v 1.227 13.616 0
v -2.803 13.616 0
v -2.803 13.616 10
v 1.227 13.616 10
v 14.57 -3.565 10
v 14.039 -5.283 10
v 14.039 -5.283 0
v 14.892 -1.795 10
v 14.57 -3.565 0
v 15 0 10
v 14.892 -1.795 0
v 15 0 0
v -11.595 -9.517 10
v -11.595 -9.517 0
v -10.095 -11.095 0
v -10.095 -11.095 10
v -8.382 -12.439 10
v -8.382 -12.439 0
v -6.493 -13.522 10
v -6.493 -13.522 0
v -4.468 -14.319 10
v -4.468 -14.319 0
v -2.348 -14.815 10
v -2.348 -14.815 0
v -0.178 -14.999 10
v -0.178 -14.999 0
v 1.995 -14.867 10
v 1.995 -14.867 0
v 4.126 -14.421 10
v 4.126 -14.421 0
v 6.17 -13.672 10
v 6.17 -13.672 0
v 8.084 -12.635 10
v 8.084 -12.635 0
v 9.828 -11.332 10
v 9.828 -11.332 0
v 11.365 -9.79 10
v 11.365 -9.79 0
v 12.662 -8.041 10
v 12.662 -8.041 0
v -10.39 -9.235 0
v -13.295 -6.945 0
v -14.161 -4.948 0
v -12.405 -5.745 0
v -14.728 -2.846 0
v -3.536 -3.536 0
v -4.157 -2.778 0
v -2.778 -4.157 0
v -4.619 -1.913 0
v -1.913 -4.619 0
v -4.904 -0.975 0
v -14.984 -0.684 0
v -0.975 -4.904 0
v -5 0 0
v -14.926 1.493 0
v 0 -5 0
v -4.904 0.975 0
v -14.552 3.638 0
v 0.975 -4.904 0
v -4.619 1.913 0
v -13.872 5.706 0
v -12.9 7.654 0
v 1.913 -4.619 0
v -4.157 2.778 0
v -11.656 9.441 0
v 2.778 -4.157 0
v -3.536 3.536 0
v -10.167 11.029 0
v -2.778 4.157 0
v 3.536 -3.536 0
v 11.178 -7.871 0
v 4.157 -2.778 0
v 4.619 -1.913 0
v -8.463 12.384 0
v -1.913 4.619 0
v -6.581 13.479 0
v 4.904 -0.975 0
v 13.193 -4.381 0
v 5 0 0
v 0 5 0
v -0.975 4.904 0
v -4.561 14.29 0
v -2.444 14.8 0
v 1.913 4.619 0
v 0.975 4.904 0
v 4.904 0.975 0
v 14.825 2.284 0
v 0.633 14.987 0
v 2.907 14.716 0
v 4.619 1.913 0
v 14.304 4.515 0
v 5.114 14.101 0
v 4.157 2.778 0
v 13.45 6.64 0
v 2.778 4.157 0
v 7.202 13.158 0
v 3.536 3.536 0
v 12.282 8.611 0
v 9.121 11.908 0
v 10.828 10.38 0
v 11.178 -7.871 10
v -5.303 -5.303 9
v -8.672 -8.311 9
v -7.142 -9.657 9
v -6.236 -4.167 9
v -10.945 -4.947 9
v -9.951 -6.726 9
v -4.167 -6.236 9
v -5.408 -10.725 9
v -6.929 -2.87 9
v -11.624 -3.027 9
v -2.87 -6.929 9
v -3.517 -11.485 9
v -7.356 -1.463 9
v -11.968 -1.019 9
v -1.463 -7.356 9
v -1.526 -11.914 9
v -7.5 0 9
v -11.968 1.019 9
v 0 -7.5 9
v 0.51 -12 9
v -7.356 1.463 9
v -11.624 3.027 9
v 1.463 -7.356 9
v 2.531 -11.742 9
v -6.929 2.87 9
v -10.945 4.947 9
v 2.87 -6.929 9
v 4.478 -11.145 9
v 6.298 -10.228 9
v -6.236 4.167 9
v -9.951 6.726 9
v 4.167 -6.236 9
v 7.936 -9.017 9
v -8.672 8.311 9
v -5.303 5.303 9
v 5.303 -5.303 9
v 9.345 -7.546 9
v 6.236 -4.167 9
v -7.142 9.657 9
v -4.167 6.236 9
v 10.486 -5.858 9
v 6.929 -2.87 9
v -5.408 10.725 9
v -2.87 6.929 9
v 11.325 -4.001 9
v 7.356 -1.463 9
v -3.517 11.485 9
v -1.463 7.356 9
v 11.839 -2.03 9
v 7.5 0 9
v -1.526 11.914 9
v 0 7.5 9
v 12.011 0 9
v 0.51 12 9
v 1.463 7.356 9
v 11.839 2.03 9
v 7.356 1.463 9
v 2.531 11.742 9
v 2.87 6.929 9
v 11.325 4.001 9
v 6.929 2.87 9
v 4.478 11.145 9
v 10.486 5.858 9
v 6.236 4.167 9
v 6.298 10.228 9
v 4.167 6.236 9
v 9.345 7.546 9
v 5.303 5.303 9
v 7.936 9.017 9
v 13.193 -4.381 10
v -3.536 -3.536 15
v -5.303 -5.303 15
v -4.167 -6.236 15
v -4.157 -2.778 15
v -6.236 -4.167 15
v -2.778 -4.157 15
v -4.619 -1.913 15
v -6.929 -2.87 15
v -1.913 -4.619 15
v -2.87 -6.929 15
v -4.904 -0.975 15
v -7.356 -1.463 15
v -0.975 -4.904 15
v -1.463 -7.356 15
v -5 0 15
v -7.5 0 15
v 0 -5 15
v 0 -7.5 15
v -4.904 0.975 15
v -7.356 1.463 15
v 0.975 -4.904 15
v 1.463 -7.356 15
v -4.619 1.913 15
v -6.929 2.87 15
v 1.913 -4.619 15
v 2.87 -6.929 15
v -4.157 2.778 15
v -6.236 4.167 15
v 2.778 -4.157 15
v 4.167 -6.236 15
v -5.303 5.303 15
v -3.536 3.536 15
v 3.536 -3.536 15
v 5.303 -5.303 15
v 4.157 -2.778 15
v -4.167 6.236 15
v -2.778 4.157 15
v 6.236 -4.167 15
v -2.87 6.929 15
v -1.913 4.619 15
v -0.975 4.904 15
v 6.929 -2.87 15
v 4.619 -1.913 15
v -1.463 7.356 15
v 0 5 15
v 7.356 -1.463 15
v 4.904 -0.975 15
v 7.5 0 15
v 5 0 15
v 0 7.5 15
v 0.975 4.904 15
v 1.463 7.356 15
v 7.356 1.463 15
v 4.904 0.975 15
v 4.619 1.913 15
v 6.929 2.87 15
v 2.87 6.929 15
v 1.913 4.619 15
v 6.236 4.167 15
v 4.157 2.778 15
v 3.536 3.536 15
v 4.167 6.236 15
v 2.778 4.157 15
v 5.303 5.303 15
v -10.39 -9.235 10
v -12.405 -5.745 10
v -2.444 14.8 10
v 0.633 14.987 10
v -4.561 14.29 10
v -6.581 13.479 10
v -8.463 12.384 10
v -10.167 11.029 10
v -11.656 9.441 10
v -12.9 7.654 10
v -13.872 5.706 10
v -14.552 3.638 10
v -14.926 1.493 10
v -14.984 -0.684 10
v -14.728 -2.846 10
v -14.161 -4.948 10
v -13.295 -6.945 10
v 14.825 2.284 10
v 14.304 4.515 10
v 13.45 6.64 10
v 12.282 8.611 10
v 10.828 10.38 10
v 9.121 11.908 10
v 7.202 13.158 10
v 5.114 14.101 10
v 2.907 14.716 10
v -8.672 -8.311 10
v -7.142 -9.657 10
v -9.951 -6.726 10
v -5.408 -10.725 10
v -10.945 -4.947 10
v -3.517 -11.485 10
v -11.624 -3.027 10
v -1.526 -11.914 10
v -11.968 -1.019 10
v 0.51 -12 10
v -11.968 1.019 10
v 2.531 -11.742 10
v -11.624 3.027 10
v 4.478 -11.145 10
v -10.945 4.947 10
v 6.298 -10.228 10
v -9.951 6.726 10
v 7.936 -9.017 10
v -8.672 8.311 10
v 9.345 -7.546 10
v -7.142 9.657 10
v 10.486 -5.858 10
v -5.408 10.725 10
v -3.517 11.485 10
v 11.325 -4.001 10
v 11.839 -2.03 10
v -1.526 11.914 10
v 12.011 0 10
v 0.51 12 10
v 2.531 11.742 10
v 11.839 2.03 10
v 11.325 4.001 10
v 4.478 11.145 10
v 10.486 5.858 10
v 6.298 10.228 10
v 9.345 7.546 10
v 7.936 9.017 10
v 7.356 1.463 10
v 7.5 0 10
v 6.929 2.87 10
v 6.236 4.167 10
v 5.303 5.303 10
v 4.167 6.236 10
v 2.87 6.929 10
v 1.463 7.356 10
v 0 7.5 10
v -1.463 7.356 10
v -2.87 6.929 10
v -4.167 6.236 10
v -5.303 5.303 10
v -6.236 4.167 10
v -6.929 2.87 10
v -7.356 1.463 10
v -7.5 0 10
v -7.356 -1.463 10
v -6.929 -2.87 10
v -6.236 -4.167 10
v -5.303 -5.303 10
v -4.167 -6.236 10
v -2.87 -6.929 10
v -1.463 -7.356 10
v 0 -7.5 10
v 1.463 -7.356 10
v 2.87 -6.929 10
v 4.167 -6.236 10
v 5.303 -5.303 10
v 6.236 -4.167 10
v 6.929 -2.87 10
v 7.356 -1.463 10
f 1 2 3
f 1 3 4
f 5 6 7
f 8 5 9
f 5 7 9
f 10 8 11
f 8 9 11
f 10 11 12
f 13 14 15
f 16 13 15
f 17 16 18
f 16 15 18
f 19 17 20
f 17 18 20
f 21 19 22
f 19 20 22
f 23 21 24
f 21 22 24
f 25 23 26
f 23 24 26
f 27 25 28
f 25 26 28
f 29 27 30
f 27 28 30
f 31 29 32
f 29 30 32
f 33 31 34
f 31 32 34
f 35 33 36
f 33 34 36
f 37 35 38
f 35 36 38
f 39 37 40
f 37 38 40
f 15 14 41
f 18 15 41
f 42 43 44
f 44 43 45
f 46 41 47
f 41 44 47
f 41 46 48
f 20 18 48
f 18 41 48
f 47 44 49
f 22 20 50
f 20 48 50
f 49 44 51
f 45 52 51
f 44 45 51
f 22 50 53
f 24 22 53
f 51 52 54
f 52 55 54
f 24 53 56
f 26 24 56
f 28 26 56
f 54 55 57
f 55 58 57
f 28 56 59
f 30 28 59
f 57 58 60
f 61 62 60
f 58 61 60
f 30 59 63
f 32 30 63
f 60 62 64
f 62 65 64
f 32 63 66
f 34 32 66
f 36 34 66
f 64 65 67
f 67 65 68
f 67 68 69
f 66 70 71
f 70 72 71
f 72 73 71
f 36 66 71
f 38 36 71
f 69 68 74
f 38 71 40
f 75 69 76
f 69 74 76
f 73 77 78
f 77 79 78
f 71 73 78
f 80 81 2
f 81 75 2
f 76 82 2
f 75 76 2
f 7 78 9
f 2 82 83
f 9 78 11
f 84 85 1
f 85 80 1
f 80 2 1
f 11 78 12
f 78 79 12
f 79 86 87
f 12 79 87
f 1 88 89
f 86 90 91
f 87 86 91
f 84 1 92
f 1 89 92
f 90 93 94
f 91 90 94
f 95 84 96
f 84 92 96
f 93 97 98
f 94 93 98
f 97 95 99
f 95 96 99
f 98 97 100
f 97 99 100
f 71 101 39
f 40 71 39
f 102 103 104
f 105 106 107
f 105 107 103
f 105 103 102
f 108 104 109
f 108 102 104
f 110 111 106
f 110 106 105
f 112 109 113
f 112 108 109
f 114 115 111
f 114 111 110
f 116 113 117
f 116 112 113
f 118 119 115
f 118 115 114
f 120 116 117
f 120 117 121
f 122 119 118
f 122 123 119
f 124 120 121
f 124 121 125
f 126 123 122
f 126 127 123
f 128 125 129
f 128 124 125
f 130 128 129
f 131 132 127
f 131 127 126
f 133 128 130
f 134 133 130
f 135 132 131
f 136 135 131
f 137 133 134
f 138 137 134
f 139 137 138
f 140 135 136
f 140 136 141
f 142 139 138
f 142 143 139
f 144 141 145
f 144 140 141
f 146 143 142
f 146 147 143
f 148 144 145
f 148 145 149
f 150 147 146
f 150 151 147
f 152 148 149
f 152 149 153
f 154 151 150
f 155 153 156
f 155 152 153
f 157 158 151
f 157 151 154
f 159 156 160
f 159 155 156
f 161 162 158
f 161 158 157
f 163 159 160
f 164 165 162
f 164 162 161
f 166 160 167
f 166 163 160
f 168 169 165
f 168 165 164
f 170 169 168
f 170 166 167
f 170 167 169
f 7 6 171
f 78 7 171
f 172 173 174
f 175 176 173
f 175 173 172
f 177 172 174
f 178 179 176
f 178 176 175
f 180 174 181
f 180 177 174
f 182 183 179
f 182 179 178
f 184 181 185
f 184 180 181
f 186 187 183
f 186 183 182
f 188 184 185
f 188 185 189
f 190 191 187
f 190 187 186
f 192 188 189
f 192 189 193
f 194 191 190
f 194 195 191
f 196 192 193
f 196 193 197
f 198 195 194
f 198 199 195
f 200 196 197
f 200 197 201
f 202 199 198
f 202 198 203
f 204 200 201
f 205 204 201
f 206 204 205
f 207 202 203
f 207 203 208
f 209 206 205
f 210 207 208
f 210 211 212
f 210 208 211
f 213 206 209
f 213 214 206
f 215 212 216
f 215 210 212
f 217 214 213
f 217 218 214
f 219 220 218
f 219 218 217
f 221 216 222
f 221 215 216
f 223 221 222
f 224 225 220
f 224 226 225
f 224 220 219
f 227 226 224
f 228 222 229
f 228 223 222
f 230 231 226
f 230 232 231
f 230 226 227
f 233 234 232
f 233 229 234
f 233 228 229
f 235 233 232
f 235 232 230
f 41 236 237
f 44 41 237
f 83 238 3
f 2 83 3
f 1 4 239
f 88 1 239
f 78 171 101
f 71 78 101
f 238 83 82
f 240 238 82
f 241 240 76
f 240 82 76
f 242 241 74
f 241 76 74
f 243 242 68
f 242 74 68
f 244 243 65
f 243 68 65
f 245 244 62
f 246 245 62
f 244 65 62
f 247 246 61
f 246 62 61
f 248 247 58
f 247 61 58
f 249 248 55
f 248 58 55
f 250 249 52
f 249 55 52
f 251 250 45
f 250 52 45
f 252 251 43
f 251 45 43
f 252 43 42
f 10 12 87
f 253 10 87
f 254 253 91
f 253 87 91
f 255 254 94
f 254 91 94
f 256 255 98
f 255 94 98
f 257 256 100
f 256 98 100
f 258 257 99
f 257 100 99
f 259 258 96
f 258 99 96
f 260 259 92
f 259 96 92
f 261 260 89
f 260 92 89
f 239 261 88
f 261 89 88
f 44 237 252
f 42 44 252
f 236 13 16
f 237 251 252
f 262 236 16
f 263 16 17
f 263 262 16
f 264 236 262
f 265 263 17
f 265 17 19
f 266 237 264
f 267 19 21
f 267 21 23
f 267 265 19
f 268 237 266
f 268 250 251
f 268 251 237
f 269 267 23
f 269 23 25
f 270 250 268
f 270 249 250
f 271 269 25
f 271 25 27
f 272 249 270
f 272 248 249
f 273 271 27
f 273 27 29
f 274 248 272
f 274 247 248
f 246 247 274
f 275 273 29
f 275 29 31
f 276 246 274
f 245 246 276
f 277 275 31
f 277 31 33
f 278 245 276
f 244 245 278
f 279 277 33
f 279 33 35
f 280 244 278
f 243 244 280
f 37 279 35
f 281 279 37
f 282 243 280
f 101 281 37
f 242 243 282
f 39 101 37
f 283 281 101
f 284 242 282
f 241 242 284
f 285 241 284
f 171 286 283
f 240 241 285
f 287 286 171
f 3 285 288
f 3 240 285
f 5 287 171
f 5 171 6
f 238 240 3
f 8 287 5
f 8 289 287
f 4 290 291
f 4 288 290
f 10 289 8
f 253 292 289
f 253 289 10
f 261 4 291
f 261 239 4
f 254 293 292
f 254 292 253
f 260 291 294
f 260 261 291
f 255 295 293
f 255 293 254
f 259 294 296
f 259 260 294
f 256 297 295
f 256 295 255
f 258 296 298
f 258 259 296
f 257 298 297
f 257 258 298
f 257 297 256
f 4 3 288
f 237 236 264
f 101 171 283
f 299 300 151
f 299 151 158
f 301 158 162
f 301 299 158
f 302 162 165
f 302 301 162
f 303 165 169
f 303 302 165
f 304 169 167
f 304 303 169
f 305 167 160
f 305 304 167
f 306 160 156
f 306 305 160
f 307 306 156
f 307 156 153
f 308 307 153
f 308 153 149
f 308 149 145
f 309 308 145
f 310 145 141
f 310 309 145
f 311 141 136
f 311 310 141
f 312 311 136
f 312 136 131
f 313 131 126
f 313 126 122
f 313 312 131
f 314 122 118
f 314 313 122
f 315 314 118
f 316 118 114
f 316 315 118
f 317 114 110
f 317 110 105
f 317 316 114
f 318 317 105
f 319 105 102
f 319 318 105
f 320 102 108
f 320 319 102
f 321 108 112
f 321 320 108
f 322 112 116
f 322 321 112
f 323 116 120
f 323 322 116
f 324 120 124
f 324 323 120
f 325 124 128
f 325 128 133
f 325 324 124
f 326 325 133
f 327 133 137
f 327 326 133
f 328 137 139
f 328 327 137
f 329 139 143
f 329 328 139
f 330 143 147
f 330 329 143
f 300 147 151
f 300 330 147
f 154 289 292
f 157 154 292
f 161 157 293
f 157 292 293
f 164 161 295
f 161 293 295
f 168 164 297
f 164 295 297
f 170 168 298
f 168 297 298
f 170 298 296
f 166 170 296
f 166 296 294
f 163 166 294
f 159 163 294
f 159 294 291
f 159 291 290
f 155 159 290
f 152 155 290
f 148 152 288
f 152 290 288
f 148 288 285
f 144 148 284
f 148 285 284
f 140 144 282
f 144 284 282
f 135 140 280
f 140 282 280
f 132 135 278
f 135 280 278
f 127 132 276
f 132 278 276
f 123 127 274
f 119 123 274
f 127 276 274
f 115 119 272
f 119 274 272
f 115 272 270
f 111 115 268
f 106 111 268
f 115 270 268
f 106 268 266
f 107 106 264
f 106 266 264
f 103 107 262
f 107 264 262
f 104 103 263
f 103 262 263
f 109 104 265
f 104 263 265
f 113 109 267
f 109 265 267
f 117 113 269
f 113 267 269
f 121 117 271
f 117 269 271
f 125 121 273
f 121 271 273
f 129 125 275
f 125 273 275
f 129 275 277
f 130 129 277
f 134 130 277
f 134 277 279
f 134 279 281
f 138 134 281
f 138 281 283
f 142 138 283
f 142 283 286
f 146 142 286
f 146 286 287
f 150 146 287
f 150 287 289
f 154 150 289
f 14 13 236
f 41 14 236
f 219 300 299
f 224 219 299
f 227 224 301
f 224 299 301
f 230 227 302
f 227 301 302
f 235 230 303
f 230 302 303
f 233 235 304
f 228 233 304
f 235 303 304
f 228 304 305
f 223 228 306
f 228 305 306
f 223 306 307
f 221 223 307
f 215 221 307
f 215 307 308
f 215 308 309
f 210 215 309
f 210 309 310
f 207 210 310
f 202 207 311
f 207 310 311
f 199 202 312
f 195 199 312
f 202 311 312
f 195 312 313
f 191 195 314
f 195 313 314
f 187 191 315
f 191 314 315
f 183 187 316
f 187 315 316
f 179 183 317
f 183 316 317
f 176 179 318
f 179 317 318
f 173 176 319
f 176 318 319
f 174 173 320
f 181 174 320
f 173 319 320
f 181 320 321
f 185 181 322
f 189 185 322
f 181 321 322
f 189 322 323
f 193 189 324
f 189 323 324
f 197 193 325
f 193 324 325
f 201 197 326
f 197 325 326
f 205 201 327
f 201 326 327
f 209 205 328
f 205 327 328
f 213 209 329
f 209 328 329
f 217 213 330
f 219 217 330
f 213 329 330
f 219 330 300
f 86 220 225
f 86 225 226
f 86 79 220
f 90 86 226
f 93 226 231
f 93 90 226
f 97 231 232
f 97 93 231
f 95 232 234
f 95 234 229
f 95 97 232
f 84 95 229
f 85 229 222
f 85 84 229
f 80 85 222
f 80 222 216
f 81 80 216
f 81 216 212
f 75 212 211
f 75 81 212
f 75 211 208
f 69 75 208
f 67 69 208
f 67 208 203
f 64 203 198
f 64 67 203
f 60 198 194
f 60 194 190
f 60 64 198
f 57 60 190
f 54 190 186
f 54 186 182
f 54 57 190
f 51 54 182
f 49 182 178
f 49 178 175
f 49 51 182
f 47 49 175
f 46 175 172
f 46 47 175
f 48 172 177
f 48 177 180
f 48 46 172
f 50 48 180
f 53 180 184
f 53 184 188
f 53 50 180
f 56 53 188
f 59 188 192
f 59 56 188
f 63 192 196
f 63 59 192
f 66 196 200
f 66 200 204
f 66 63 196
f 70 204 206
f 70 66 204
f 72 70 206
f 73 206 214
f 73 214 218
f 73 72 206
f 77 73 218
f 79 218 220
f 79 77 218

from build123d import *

# Parameters (mm, degrees)
F0_R     = 15
F0_R_2   = 5
F1_DEPTH = 10
F2_R     = 7.5
F2_R_2   = 5
F3_DEPTH = 5
F4_R     = 12.0112808184
F4_R_2   = 11.2253512915
F4_R_3   = 7.5
F5_DEPTH = 1
F7_DEPTH = 25


with BuildPart() as f1:
    # F0 (on Top) → F1 (new body)
    with BuildSketch(Plane.XY):
        Circle(F0_R)
        Circle(F0_R_2, mode=Mode.SUBTRACT)
    extrude(amount=F1_DEPTH)

    # F2 (on face) → F3 (join)
    with BuildSketch(Plane.XY.offset(10)):
        Circle(F2_R)
        Circle(F2_R_2, mode=Mode.SUBTRACT)
    extrude(amount=F3_DEPTH)

    # F4 (on face) → F5 (cut)
    with BuildSketch(Plane.XY.offset(10)):
        Circle(F4_R)
        Circle(F4_R_2, mode=Mode.SUBTRACT)
        Circle(F4_R_2)
        Circle(F4_R_3, mode=Mode.SUBTRACT)
    extrude(amount=-F5_DEPTH, mode=Mode.SUBTRACT)

    # F6 (on face) → F7 (cut)
    with BuildSketch(Plane.XY.offset(10)):
        Polygon((-1.9454706926, 16.4457075298), (-2.8029684909, 13.6159658432), (1.2272709282, 13.6159658432), (0, 16.4457075298), align=None)
        Polygon((-12.4054077814, -5.7451351204), (-14.242400504, -8.2228537649), (-13.2696651577, -9.907680807), (-10.3902880718, -9.2354248407), align=None)
        Polygon((11.1781368532, -7.8708307228), (14.242400504, -8.2228537649), (15.2151358503, -6.5380267228), (13.1932565627, -4.3805410025), align=None)
    extrude(amount=-F7_DEPTH, mode=Mode.SUBTRACT)


solid = f1.part
